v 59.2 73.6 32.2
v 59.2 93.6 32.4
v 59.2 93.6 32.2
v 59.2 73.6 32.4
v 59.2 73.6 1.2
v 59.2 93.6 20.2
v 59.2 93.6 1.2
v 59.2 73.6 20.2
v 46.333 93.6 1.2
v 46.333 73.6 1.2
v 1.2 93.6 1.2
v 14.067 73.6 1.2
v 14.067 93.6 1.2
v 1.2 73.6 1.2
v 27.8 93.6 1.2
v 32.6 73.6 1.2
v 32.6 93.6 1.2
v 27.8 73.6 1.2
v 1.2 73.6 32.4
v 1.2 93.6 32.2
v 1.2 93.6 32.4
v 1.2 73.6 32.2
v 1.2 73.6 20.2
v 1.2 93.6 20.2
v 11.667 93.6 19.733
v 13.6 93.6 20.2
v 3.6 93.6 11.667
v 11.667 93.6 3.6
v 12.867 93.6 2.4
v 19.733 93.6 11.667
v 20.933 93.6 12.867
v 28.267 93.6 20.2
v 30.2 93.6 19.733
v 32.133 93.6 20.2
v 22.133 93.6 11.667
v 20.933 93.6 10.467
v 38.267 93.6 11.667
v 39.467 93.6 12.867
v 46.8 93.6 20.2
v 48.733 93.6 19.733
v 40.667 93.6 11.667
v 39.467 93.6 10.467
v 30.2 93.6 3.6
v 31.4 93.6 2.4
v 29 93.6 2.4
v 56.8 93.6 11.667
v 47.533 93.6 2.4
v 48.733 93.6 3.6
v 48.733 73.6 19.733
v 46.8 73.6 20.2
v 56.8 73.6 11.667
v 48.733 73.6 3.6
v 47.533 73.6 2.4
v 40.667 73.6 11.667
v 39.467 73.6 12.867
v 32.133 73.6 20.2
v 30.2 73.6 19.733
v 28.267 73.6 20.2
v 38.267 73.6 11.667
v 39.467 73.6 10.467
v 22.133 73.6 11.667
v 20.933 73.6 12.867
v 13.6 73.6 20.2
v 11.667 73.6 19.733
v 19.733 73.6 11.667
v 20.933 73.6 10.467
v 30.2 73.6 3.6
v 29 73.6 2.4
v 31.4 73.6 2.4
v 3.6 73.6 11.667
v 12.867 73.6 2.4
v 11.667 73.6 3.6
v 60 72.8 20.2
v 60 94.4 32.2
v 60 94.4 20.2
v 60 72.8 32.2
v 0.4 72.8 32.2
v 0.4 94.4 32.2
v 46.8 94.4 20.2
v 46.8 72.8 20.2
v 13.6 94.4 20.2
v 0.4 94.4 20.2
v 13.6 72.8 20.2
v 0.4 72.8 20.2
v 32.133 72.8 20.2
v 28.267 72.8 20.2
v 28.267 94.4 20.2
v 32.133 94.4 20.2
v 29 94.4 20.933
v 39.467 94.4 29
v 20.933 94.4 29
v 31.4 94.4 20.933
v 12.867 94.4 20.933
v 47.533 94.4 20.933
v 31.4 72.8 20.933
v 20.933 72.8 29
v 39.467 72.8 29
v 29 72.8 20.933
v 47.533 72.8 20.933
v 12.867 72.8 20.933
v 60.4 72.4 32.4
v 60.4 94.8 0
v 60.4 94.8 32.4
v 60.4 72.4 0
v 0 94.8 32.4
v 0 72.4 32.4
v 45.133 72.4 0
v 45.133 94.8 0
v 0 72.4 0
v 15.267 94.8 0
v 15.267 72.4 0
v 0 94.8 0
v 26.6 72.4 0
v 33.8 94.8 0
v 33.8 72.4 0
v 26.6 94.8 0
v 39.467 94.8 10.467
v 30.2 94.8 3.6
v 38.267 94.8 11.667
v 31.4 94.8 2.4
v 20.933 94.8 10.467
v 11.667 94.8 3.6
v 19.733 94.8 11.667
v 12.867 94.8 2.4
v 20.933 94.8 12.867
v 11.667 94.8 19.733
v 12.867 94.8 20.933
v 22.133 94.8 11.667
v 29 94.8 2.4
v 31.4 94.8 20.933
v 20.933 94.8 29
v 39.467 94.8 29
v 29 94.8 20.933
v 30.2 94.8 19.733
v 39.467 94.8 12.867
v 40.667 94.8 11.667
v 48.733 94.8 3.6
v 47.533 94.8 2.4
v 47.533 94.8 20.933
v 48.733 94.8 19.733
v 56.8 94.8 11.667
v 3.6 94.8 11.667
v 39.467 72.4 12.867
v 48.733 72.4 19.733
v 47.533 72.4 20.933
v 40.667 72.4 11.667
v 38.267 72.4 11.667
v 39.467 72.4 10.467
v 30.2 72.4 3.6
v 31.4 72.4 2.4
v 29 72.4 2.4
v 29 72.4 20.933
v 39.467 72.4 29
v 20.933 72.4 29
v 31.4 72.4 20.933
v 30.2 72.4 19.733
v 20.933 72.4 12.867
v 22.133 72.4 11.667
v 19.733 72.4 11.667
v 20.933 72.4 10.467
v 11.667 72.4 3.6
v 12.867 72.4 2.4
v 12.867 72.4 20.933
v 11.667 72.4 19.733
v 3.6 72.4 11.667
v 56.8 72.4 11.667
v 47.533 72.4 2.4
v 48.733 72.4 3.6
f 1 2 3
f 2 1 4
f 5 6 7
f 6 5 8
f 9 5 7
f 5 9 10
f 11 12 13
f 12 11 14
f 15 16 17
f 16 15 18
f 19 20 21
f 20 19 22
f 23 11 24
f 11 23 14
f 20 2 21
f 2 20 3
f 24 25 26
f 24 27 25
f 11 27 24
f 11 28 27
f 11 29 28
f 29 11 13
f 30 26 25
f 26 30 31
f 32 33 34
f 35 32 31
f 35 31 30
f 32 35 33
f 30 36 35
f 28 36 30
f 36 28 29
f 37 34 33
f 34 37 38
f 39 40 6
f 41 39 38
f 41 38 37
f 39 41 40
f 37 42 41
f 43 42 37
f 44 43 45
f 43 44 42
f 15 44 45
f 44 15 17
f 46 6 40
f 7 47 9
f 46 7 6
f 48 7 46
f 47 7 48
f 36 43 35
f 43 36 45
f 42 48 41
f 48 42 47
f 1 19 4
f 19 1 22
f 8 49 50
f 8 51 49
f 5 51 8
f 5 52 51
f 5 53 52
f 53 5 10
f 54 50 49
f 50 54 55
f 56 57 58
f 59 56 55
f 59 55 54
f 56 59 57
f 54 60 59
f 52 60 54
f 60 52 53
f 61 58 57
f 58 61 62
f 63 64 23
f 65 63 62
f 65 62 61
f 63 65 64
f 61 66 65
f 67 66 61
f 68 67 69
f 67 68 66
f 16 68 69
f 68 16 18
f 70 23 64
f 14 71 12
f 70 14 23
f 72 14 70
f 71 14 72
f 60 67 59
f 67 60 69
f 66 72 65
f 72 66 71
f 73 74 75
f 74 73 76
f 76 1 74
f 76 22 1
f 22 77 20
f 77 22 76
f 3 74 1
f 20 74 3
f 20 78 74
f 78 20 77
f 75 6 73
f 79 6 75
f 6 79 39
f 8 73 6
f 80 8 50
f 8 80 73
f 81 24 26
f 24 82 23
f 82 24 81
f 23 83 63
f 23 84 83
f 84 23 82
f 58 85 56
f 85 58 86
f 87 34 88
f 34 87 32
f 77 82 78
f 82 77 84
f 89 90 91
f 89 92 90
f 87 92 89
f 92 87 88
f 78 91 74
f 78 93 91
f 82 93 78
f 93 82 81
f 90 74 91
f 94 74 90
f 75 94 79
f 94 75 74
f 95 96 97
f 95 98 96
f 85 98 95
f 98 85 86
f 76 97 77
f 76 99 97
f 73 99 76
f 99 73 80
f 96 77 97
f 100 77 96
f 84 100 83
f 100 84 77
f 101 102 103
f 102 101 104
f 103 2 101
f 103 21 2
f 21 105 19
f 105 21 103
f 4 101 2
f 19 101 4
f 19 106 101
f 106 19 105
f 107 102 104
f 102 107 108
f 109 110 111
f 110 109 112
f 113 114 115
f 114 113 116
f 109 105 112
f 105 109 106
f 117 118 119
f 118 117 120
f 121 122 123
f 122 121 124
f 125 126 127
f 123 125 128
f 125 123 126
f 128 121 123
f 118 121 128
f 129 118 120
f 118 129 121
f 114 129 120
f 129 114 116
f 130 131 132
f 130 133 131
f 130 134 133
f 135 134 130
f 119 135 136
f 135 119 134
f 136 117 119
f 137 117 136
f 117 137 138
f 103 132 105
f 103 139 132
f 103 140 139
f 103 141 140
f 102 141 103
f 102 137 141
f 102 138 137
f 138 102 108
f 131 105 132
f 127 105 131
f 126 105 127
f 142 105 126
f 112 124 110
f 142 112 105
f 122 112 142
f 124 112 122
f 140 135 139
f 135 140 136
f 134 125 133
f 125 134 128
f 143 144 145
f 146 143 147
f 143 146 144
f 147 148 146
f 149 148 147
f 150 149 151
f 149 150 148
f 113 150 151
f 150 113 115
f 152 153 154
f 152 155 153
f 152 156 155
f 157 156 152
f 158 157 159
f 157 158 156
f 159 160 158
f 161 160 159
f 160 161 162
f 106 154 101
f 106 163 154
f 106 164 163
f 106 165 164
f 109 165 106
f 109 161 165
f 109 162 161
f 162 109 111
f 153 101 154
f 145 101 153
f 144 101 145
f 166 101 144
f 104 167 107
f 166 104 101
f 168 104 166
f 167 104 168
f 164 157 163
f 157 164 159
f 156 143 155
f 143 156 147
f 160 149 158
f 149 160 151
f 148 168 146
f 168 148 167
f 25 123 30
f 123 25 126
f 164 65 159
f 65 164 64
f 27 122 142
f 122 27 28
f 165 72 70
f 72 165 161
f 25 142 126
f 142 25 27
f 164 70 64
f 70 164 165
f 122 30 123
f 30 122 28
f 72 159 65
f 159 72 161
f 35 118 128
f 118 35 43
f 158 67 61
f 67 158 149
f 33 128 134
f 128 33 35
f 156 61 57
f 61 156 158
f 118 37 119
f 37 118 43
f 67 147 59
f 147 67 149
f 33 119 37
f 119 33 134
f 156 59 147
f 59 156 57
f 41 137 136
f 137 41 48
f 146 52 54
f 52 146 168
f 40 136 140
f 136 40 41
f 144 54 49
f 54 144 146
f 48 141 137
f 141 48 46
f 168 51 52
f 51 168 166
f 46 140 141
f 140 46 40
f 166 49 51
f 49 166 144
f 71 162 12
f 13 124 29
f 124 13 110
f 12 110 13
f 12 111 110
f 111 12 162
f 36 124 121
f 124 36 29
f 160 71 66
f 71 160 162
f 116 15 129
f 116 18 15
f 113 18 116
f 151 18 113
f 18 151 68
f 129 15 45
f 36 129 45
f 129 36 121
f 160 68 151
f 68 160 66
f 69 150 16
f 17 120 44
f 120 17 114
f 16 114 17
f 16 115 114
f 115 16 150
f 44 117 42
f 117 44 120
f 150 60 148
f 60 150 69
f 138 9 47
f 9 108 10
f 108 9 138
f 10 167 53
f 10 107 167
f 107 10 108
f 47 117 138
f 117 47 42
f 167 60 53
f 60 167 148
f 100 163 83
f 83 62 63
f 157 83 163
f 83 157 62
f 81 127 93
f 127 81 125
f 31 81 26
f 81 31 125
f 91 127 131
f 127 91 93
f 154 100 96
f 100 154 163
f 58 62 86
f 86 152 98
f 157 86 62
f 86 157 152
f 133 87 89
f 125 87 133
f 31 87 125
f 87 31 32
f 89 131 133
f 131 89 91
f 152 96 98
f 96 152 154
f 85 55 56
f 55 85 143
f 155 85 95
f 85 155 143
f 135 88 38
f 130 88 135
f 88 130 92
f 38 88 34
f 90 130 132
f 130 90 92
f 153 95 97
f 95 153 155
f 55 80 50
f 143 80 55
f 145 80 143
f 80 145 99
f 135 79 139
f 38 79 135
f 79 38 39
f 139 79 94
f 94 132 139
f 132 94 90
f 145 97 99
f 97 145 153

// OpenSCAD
$fn=100;
/* dimensions */

card_w = 58; //60
card_h = 90;
card_z = 20;
box_thickness = 1.2;
box_neck_thickness = 0.8;


/* proportions */
box_base_to_lid = 2/3;
box_neck_to_lid = 1/3;

box_base_interior_h = card_h*box_base_to_lid;
box_lid_interior_h = card_h*1/3;
box_neck_h = box_lid_interior_h*box_neck_to_lid;

module box_base() {
    difference() {
        union() {
            cube([card_w+2*box_thickness, card_z+2*box_thickness, box_base_interior_h+2*box_thickness]);
            translate([box_thickness-box_neck_thickness,box_thickness-box_neck_thickness,box_thickness+box_base_interior_h])
                cube([card_w+2*box_neck_thickness, card_z+2*box_neck_thickness, box_neck_h+2*box_thickness]);
        }
        translate([box_thickness,box_thickness,box_thickness]) cube([card_w, card_z, card_h]);
    }
}

module box_lid() {
    difference() {
        union() {
            cube([card_w+2*box_thickness, card_z+2*box_thickness, box_lid_interior_h+2*box_thickness]);
            
        }
        translate([box_thickness,box_thickness,box_thickness])
            union() {
                cube([card_w, card_z, card_h]);
                translate([-box_neck_thickness,-box_neck_thickness,box_lid_interior_h-box_neck_h-1])
                cube([card_w+2*box_neck_thickness, card_z+2*box_neck_thickness, box_neck_h+2]);
            }
    }
}

module holes(w, h, wn=3, hn=3, t=2.4, h=100) {
    t_multiplier=2+wn-1;
    d=(w-t*t_multiplier)/wn;
    
    translate([d/2,d/2,0])
        for(h_count = [0 : hn-1]) {
            translate([0,t+h_count*(d+t),0]) {
                for(w_count = [0 : wn-1]) {
                    translate([t+w_count*(d+t),0,h/2])
                        rotate([0,0,45]) cube([(sqrt((d/2)*(d/2)*2)),(sqrt((d/2)*(d/2)*2)),h], center=true);
                        //cylinder(d=d, h=h);
                }
            }
        }
    translate([d+t/2,d+t/2,0])
        for(h_count = [0 : hn-2]) {
            translate([0,t+h_count*(d+t),0]) {
                for(w_count = [0 : wn-2]) {
                    translate([t+w_count*(d+t),0,h/2])
                        rotate([0,0,45]) cube([(sqrt((d/2)*(d/2)*2)),(sqrt((d/2)*(d/2)*2)),h], center=true);
                        //cylinder(d=d-4*t, h=h);
                }
            }
        }
}

//////////////////////////
// Put it all together //
////////////////////////

choice=0;

if(choice==1){
difference() {
    box_base();
    translate([box_thickness,50,box_thickness]) rotate([90,0,0]) holes(card_w, card_h, wn=4, hn=4);
}
}
else
{
translate([0, card_z+box_thickness*2+50, 0])
difference() {
    box_lid();
    translate([box_thickness,50,box_thickness]) rotate([90,0,0]) holes(card_w, card_h, hn=1);
}
}
